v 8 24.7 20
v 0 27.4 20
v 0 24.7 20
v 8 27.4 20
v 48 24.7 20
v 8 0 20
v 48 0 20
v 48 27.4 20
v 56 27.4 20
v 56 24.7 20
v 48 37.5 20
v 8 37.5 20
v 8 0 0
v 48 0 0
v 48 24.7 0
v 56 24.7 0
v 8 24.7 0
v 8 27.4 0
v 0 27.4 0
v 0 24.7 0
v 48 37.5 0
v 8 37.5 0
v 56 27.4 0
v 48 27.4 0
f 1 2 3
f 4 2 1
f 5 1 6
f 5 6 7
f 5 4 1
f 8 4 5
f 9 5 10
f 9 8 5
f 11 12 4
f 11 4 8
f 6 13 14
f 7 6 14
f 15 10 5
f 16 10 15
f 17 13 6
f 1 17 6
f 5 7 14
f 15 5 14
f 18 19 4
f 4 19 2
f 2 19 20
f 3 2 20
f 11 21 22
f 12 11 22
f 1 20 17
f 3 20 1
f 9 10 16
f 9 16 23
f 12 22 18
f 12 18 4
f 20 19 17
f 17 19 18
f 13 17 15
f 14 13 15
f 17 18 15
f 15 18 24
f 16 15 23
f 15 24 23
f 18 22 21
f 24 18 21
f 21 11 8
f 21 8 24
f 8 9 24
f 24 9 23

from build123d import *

# Parameters (mm, degrees)
SKETCH1_W           = 8.153779141
SKETCH1_H           = 12.8
SKETCH1_H_2         = 24.7
SKETCH1_W_2         = 40
SKETCH1_W_3         = 7.846220859
BOSS_EXTRUDE1_DEPTH = 20
SKETCH4_W           = 20
SKETCH4_H           = 24.7
CUT_EXTRUDE1_DEPTH  = 8
SKETCH5_W           = 20
SKETCH5_H           = 24.7
CUT_EXTRUDE2_DEPTH  = 8
SKETCH6_W           = 20
SKETCH6_H           = 10.1
CUT_EXTRUDE3_DEPTH  = 8
SKETCH7_W           = 20
SKETCH7_H           = 10.1
CUT_EXTRUDE4_DEPTH  = 8


with BuildPart() as part:
    # Sketch1 → Boss-Extrude1 (new body)
    with BuildSketch(Plane.XY):
        with Locations((4.076889571, 31.1)):
            Rectangle(SKETCH1_W, SKETCH1_H)
        with Locations((4.076889571, 12.35)):
            Rectangle(SKETCH1_W, SKETCH1_H_2)
        with Locations((28.153779141, 31.1)):
            Rectangle(SKETCH1_W_2, SKETCH1_H)
        with Locations((28.153779141, 12.35)):
            Rectangle(SKETCH1_W_2, SKETCH1_H_2)
        with Locations((52.076889571, 31.1)):
            Rectangle(SKETCH1_W_3, SKETCH1_H)
        with Locations((52.076889571, 12.35)):
            Rectangle(SKETCH1_W_3, SKETCH1_H_2)
    extrude(amount=BOSS_EXTRUDE1_DEPTH)

    # Sketch4 → Cut-Extrude1 (cut)
    with BuildSketch(Plane.ZY):
        with Locations((10, 12.35)):
            Rectangle(SKETCH4_W, SKETCH4_H)
    extrude(amount=-CUT_EXTRUDE1_DEPTH, mode=Mode.SUBTRACT)

    # Sketch5 → Cut-Extrude2 (cut)
    with BuildSketch(Plane(origin=(56, 0, 0), x_dir=(0, 0, -1), z_dir=(1, 0, 0))):
        with Locations((-10, 12.35)):
            Rectangle(SKETCH5_W, SKETCH5_H)
    extrude(amount=-CUT_EXTRUDE2_DEPTH, mode=Mode.SUBTRACT)

    # Sketch6 → Cut-Extrude3 (cut)
    with BuildSketch(Plane(origin=(56, 0, 0), x_dir=(0, 0, -1), z_dir=(1, 0, 0))):
        with Locations((-10, 32.45)):
            Rectangle(SKETCH6_W, SKETCH6_H)
    extrude(amount=-CUT_EXTRUDE3_DEPTH, mode=Mode.SUBTRACT)

    # Sketch7 → Cut-Extrude4 (cut)
    with BuildSketch(Plane.ZY):
        with Locations((10, 32.45)):
            Rectangle(SKETCH7_W, SKETCH7_H)
    extrude(amount=-CUT_EXTRUDE4_DEPTH, mode=Mode.SUBTRACT)


solid = part.part
